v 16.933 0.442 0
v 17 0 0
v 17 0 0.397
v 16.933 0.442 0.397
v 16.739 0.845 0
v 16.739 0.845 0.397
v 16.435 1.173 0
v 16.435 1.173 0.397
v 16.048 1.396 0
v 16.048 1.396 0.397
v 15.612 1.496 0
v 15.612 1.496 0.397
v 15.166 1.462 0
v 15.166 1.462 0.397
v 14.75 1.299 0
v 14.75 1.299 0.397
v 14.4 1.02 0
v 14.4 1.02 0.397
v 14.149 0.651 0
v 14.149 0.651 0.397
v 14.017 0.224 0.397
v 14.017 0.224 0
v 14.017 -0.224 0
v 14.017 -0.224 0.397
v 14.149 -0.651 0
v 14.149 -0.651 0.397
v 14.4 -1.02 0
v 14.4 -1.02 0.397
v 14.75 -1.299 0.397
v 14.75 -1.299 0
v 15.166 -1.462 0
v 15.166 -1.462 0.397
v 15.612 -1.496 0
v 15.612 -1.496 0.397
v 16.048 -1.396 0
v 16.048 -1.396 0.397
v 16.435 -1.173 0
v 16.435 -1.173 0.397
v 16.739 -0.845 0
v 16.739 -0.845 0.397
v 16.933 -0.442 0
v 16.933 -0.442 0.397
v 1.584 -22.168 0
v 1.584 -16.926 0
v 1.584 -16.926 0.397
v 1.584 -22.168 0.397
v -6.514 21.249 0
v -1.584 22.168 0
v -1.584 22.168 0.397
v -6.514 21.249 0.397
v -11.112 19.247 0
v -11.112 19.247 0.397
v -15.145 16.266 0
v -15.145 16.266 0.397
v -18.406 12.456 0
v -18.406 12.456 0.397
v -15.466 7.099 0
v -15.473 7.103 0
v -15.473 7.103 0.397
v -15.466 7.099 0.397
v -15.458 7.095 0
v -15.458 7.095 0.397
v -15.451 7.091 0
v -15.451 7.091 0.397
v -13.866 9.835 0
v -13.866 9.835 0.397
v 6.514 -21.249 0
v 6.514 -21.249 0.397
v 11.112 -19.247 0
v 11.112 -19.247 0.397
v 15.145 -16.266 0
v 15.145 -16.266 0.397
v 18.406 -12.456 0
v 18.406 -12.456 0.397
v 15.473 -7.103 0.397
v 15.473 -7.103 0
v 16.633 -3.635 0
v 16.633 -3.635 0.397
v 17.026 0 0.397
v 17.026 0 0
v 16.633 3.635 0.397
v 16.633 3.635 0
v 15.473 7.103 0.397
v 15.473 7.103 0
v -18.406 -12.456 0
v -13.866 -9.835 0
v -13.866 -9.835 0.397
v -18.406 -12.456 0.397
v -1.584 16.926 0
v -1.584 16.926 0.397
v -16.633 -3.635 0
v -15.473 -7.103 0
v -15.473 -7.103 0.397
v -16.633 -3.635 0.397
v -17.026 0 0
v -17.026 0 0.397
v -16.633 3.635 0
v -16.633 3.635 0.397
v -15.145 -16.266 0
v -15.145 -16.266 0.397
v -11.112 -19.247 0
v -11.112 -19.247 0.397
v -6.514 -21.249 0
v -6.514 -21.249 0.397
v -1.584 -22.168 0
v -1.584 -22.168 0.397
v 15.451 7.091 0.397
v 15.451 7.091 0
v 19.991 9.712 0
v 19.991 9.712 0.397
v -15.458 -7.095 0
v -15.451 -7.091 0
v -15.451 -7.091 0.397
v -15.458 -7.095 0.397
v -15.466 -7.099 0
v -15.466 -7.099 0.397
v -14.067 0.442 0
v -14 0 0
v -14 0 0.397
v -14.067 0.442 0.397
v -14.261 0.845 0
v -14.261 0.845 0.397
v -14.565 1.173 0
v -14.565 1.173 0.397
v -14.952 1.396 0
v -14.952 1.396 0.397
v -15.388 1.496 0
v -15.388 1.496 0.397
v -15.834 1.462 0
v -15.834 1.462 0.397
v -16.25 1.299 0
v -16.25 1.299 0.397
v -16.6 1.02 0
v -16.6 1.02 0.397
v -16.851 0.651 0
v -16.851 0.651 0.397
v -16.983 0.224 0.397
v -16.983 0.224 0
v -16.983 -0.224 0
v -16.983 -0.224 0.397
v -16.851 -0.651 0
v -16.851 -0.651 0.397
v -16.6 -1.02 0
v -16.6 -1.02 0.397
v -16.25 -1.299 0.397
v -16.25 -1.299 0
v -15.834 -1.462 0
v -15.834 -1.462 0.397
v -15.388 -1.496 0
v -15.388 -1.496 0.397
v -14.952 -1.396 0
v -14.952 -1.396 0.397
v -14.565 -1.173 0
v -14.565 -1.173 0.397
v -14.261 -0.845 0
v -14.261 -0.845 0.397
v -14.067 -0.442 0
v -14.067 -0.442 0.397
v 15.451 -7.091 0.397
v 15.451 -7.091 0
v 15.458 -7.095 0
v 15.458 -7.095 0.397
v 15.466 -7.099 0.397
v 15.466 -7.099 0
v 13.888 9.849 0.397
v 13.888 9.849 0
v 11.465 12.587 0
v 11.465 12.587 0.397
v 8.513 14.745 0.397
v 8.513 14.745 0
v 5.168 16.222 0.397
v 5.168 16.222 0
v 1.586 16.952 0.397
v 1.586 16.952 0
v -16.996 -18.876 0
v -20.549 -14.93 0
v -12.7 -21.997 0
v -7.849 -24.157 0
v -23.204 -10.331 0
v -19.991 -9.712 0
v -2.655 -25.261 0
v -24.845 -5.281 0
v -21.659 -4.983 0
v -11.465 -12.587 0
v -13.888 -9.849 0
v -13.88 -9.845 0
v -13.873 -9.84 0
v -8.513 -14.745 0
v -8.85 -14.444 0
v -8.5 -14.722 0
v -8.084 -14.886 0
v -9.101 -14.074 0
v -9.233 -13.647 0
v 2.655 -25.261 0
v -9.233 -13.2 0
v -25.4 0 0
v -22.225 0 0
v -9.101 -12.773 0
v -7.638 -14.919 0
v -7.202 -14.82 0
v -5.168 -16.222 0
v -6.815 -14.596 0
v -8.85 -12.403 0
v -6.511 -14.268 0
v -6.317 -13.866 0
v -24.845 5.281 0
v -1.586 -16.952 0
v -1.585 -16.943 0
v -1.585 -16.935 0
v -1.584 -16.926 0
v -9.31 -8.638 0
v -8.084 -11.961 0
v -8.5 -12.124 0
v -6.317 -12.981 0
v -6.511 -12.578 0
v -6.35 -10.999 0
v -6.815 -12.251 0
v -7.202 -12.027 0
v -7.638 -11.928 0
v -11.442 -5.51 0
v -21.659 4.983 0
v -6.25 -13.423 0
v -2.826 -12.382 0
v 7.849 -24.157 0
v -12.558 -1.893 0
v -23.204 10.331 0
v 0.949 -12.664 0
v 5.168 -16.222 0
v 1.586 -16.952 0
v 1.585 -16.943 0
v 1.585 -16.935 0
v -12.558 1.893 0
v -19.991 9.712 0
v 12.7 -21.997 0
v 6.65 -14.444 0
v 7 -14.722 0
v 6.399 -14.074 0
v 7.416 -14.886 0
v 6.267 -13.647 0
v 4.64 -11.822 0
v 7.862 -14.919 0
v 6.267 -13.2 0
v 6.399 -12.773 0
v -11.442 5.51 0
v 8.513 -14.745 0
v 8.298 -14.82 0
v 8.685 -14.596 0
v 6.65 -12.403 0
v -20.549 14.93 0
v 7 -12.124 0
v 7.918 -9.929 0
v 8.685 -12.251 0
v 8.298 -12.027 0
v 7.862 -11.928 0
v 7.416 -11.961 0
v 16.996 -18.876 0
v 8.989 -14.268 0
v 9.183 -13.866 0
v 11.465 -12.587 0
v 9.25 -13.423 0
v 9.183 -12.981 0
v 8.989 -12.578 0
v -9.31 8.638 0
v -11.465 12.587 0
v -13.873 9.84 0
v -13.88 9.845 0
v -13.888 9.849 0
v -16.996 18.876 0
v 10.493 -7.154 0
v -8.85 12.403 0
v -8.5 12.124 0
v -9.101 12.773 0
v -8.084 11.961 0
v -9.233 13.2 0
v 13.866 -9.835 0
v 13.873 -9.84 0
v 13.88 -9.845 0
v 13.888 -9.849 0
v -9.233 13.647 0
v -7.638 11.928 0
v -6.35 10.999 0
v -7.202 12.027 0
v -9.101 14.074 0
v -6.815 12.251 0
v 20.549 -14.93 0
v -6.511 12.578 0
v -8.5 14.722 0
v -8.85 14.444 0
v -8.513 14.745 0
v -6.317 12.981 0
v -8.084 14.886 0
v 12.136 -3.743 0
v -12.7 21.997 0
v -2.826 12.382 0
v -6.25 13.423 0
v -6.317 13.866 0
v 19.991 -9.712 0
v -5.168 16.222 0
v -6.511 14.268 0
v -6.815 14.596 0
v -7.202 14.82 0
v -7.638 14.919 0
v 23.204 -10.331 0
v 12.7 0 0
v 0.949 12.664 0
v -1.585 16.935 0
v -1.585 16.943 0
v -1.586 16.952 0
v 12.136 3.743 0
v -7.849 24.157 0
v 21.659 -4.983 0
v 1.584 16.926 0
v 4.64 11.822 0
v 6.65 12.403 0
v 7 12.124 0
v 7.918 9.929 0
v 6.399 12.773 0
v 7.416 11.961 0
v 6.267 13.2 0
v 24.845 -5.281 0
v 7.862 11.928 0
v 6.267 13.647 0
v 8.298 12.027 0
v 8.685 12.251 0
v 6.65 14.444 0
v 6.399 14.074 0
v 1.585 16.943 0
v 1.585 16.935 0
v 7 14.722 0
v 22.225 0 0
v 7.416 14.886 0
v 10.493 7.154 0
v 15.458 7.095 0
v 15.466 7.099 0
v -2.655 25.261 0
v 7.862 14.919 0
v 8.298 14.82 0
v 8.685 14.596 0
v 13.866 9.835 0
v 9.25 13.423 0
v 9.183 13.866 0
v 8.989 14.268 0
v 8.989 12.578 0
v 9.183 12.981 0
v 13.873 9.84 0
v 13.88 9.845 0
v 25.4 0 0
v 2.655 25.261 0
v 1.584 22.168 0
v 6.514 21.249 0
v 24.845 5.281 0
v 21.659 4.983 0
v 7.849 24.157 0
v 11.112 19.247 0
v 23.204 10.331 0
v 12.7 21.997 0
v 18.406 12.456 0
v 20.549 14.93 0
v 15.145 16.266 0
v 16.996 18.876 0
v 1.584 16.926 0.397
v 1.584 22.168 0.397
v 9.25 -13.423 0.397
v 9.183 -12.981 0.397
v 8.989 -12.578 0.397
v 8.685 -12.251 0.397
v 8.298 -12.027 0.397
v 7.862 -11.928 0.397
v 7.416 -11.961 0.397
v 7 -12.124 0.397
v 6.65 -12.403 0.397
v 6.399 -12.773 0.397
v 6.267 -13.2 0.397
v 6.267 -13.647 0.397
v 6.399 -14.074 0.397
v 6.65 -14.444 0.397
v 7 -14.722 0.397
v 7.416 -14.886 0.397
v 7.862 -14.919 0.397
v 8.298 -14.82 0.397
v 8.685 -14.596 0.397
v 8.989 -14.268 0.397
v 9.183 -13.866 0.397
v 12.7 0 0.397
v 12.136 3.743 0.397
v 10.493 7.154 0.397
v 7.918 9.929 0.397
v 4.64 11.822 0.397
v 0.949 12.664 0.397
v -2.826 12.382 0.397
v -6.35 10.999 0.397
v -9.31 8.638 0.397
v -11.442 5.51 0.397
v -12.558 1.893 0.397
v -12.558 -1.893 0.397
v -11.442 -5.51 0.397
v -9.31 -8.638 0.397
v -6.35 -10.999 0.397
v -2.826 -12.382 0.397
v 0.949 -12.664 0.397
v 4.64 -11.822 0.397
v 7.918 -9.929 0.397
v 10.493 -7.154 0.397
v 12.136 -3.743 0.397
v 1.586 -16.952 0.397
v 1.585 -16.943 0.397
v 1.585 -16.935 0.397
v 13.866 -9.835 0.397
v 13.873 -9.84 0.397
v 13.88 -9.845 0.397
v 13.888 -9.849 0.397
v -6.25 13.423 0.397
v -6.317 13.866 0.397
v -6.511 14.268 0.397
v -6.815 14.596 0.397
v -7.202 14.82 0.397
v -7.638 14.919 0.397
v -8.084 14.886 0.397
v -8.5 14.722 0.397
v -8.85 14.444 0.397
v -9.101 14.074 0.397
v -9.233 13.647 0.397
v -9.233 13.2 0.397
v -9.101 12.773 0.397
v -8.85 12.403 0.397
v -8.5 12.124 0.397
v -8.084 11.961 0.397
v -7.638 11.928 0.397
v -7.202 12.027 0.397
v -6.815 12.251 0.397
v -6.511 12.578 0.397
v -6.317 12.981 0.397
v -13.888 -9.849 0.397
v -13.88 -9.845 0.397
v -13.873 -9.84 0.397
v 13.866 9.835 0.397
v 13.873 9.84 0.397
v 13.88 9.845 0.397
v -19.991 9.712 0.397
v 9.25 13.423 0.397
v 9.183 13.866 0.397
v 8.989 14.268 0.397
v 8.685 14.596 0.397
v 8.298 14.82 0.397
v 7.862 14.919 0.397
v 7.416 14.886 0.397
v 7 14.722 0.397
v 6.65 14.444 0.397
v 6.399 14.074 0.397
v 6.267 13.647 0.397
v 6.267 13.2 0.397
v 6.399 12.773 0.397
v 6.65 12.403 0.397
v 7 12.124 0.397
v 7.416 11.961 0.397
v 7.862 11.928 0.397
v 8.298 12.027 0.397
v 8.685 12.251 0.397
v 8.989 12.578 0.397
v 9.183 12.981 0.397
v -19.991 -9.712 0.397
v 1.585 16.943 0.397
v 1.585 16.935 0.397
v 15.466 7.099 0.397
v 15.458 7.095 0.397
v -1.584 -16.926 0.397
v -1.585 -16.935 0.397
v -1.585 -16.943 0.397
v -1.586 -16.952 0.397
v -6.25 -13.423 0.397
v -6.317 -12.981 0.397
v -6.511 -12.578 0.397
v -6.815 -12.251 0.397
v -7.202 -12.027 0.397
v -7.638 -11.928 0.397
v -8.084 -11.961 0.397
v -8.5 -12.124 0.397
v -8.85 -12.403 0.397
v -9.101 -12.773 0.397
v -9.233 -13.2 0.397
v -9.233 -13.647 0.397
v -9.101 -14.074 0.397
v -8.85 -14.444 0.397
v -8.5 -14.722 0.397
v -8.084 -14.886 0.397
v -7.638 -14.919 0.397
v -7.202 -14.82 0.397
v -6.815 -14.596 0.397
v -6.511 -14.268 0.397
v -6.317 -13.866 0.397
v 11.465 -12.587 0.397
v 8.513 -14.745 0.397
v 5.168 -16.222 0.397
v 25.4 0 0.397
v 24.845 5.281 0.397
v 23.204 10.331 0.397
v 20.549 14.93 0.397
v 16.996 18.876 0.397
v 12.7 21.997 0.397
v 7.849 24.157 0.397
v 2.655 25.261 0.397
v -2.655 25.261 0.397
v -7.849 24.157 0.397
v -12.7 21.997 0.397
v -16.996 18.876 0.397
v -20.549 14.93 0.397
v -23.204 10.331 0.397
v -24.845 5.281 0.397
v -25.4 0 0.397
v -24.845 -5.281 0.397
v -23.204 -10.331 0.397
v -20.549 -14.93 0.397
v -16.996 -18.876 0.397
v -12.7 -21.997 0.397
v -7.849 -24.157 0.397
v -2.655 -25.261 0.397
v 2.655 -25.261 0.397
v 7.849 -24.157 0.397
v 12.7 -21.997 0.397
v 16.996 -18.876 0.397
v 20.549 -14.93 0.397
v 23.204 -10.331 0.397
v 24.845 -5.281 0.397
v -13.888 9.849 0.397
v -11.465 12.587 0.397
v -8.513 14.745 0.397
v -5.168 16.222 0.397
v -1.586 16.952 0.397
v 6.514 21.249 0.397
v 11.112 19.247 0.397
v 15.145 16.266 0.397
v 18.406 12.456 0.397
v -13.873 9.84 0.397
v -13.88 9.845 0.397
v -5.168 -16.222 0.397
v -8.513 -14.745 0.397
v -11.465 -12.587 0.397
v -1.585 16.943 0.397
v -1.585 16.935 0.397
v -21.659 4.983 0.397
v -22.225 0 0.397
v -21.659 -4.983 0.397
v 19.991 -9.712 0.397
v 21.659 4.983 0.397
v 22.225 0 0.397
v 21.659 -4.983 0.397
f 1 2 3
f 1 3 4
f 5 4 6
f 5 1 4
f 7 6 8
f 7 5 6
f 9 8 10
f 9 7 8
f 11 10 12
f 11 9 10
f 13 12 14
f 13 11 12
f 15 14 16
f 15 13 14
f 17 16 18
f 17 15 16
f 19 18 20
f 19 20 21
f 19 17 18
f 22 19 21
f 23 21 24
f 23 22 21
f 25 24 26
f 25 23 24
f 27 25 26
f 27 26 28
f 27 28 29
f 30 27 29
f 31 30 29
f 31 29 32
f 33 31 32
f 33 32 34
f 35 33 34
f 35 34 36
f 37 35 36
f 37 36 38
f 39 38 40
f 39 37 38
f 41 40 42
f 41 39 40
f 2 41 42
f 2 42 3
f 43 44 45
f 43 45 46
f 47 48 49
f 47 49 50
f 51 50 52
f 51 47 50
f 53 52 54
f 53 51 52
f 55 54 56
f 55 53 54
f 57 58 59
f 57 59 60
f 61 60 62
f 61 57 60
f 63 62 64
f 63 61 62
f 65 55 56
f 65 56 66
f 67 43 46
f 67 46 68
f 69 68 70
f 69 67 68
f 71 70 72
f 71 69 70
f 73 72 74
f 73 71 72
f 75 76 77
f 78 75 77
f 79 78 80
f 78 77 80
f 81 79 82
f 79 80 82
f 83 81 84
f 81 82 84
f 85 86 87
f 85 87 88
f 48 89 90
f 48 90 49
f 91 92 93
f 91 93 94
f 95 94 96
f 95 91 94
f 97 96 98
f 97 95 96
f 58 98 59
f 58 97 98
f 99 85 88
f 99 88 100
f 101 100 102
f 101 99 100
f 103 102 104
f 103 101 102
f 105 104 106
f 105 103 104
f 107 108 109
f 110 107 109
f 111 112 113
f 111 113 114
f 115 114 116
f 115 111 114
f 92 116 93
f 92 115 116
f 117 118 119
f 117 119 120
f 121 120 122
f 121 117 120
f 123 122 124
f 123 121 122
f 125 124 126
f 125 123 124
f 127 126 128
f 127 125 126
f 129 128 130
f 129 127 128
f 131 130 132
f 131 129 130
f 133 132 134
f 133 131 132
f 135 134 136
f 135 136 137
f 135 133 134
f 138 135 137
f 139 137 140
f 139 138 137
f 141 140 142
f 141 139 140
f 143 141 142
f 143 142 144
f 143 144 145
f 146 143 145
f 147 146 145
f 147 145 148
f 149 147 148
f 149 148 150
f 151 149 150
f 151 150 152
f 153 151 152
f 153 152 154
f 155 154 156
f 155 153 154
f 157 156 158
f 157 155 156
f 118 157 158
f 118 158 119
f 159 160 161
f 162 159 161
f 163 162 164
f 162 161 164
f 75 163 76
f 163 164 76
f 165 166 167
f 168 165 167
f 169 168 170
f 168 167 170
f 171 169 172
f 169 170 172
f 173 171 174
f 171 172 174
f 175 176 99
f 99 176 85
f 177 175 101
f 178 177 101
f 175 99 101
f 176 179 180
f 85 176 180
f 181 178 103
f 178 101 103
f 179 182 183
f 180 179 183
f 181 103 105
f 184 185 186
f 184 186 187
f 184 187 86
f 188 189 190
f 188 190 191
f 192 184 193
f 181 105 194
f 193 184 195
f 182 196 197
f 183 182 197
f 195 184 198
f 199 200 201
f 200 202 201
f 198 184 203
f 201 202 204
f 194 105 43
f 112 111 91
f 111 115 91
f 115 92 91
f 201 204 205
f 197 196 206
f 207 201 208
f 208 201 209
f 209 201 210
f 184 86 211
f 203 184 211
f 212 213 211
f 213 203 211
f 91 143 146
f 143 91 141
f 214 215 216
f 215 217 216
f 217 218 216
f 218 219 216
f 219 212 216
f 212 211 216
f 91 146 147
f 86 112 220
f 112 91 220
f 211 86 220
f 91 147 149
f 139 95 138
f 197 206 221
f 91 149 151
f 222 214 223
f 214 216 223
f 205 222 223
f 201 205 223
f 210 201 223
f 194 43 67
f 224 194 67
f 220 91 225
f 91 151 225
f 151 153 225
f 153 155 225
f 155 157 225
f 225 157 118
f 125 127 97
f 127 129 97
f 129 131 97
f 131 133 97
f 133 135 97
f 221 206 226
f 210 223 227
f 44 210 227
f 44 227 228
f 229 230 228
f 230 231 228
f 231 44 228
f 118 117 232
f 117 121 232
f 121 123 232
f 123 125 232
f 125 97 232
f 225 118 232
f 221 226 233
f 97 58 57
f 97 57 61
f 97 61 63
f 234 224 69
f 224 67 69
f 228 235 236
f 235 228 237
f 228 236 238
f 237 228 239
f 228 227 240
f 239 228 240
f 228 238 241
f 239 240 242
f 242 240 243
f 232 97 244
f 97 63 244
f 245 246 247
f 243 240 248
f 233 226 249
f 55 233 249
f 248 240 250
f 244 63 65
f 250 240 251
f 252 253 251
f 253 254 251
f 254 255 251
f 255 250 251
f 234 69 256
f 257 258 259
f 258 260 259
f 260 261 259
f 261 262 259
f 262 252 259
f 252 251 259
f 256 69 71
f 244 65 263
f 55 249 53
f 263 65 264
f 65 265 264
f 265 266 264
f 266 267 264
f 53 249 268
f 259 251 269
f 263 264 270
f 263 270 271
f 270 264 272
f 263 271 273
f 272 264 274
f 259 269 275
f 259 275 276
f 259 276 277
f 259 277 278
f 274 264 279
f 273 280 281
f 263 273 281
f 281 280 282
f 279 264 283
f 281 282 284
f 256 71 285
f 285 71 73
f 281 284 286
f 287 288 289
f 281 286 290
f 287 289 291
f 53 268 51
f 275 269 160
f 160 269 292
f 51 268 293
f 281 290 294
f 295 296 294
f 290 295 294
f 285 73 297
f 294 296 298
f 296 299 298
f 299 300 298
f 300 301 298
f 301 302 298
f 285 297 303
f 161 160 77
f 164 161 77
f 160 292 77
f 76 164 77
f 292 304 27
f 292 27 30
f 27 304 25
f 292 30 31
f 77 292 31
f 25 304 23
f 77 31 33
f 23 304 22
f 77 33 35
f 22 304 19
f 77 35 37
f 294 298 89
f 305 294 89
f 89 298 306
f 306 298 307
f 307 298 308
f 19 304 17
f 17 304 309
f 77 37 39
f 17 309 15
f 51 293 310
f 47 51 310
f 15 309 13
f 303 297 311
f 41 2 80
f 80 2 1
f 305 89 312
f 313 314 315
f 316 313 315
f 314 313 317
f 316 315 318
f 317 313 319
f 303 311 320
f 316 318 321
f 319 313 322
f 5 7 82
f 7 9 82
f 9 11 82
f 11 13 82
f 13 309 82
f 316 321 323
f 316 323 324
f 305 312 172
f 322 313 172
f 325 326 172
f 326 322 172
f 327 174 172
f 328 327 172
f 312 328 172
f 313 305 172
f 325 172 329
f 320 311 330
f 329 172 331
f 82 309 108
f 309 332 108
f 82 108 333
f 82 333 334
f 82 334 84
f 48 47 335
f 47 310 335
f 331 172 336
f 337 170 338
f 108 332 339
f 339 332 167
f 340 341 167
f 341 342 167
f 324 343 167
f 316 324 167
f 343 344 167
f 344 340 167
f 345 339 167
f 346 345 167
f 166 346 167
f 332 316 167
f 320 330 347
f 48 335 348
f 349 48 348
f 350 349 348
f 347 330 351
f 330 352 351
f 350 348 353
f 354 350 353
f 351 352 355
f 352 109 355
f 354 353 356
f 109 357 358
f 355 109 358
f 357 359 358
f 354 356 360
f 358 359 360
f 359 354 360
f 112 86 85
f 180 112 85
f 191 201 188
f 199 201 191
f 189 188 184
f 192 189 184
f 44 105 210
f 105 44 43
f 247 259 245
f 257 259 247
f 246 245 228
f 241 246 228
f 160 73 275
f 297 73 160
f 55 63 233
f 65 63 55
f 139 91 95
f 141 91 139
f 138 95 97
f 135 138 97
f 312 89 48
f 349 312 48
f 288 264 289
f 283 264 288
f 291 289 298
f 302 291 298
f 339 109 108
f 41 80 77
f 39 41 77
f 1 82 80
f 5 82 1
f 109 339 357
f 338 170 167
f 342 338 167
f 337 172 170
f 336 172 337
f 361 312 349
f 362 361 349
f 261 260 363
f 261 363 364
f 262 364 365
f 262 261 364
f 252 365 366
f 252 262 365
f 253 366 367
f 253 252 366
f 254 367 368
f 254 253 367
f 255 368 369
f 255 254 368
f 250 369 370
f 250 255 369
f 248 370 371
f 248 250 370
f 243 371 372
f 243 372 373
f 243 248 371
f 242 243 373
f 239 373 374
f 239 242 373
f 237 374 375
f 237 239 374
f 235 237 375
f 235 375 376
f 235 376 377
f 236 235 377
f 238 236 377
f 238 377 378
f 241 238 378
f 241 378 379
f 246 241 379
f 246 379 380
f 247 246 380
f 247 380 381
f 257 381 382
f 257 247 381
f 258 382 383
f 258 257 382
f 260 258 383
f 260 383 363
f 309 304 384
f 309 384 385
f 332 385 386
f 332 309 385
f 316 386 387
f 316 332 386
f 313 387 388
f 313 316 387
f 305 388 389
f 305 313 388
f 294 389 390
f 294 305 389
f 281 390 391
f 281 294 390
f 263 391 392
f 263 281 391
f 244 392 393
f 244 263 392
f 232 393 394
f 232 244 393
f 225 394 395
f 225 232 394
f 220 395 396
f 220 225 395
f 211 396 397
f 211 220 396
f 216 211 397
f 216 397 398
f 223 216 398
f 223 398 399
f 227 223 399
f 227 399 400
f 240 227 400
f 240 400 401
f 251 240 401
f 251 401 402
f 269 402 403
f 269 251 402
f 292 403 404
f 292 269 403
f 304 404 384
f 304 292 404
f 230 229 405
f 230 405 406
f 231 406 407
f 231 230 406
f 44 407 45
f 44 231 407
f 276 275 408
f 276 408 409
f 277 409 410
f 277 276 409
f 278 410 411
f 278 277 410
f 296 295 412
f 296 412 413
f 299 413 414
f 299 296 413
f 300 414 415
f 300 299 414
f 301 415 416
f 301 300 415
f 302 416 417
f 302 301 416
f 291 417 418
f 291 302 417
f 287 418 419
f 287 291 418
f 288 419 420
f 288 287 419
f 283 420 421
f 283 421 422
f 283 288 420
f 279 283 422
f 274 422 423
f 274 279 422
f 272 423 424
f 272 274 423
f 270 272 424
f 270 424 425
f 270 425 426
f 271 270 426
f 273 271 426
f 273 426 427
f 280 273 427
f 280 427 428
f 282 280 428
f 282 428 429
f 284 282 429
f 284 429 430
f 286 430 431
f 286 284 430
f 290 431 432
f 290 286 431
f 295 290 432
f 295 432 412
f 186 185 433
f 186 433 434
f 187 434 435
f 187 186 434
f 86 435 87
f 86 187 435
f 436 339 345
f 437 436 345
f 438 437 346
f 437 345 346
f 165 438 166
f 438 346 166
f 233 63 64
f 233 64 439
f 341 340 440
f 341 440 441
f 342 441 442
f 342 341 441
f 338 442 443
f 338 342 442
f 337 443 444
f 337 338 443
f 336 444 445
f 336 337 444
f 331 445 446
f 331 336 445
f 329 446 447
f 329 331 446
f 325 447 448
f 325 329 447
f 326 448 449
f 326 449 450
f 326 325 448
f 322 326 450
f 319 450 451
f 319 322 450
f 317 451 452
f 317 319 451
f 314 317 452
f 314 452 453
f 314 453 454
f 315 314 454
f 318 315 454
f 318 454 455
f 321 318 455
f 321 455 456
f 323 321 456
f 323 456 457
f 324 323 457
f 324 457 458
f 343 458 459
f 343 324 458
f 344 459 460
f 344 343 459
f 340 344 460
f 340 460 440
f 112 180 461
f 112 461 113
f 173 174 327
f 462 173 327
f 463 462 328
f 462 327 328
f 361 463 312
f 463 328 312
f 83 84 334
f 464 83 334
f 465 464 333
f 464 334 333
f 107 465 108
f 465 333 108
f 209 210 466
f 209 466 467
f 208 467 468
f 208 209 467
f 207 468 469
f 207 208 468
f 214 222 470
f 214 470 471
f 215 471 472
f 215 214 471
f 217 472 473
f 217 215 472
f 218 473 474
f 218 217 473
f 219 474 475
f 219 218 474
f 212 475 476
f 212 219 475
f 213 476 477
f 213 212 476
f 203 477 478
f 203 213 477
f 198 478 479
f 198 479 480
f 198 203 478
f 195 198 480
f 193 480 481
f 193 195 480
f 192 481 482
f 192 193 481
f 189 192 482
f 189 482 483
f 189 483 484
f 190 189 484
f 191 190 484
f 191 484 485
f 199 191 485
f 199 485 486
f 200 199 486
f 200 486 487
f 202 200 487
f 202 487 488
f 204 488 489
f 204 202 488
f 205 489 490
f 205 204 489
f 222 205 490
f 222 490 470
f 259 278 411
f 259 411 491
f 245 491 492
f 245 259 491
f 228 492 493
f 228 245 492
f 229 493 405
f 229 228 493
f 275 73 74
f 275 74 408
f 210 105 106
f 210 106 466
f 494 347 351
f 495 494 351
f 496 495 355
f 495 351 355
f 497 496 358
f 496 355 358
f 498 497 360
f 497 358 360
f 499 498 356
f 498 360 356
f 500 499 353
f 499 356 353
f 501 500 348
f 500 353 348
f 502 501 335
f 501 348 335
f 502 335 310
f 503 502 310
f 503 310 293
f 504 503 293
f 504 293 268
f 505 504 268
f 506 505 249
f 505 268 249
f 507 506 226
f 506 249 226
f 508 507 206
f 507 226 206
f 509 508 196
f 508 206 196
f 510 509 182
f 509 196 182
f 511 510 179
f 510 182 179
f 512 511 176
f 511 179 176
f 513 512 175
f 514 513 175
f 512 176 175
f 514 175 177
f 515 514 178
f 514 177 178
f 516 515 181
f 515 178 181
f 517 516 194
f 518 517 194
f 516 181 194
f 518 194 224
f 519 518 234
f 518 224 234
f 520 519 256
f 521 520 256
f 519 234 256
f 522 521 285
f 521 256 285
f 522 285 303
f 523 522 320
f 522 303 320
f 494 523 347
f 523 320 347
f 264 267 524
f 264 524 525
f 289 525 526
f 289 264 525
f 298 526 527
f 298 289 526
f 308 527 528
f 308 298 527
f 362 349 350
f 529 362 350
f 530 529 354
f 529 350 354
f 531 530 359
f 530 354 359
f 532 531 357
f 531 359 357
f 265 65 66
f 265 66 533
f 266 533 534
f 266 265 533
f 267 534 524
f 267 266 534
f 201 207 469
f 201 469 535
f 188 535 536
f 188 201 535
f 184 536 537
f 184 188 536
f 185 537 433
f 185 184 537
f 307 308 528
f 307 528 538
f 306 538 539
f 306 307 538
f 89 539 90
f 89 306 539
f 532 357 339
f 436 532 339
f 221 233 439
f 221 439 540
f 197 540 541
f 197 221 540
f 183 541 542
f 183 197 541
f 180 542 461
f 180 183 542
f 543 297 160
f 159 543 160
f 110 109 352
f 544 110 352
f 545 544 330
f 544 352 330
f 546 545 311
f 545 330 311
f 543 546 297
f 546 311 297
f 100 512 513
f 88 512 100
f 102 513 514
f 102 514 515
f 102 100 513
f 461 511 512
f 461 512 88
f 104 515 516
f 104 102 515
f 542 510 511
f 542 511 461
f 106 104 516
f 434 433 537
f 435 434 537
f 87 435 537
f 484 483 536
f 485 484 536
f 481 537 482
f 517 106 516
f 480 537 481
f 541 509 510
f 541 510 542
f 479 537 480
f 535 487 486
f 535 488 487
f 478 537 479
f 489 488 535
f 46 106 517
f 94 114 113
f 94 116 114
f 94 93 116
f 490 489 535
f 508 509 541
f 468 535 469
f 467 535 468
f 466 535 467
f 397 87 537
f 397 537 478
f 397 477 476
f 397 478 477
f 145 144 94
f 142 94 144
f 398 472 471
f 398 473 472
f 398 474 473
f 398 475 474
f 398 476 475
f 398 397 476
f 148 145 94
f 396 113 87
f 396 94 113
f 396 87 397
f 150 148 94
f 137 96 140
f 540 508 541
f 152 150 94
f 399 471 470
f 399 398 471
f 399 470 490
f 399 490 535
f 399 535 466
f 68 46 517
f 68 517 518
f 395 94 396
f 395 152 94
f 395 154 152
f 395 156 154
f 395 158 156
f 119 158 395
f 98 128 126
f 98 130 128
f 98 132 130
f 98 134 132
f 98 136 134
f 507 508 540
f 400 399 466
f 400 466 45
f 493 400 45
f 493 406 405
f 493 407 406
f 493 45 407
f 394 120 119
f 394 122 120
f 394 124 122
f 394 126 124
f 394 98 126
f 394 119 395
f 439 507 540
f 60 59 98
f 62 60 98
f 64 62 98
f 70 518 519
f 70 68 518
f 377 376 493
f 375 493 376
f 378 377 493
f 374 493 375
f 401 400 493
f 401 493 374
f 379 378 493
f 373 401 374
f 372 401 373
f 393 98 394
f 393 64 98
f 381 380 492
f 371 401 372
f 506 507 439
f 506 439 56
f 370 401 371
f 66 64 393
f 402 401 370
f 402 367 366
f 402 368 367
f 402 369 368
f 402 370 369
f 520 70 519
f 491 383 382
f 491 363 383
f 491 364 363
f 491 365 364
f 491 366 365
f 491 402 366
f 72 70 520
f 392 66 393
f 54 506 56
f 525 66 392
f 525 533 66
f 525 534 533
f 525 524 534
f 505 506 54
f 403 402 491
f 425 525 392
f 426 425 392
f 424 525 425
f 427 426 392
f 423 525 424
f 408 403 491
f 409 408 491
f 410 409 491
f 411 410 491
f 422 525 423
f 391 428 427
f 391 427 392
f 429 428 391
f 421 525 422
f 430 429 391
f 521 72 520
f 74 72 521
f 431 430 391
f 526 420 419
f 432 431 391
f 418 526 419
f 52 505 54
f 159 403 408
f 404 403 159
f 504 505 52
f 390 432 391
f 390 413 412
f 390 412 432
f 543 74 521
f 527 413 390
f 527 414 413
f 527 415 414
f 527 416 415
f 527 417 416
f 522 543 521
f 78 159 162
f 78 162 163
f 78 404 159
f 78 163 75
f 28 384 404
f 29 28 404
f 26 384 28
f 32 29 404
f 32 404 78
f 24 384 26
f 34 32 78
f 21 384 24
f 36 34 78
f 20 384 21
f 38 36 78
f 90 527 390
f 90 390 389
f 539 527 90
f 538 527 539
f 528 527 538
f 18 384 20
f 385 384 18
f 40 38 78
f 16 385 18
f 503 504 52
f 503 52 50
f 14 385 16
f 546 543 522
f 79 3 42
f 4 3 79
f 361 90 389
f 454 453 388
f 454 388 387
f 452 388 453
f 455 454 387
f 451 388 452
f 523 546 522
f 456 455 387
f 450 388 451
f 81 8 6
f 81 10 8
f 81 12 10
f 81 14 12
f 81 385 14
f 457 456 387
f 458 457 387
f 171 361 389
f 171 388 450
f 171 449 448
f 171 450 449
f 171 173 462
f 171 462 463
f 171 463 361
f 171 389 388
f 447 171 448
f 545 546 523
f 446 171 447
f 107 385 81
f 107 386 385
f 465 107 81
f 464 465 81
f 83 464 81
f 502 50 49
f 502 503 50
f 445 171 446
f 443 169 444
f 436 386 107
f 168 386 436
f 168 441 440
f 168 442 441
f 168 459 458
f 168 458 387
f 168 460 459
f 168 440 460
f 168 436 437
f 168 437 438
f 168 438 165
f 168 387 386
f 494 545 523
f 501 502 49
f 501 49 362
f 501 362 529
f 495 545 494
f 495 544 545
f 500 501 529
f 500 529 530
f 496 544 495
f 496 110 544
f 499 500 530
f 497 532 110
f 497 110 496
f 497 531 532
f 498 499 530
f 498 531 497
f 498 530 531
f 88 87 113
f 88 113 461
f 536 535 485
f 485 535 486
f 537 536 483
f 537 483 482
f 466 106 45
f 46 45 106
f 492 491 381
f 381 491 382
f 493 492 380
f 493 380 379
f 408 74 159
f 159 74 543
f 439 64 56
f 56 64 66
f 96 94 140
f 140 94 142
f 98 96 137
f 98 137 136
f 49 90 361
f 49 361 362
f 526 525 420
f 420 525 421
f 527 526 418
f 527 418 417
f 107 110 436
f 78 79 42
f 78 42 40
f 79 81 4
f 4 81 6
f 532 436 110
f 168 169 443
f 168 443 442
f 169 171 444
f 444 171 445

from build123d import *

# Parameters (mm, degrees)
SKETCH1_R           = 25.4
SKETCH1_R_2         = 1.5
SKETCH1_R_3         = 12.7
BOSS_EXTRUDE1_DEPTH = 0.396875


with BuildPart() as part:
    # Sketch1 → Boss-Extrude1 (new body)
    with BuildSketch(Plane.XY):
        Circle(SKETCH1_R)
        with Locations((-15.5, 0)):
            Circle(SKETCH1_R_2, mode=Mode.SUBTRACT)
        with Locations((-7.75, 13.423393759)):
            Circle(SKETCH1_R_2, mode=Mode.SUBTRACT)
        with Locations((7.75, 13.423393759)):
            Circle(SKETCH1_R_2, mode=Mode.SUBTRACT)
        with Locations((15.5, 0)):
            Circle(SKETCH1_R_2, mode=Mode.SUBTRACT)
        with Locations((7.75, -13.423393759)):
            Circle(SKETCH1_R_2, mode=Mode.SUBTRACT)
        with Locations((-7.75, -13.423393759)):
            Circle(SKETCH1_R_2, mode=Mode.SUBTRACT)
        Circle(SKETCH1_R_3, mode=Mode.SUBTRACT)
        with BuildLine():
            Line((-1.58439638, 16.926006266), (-1.58439638, 22.168453106))
            ThreePointArc((-1.58439638, 22.168453106), (-11.1125, 19.247414599), (-18.406245362, 12.456354068))
            Line((-18.406245362, 12.456354068), (-13.866153221, 9.835130648))
            ThreePointArc((-13.866153221, 9.835130648), (-13.876900865, 9.842174678), (-13.88768889, 9.849154838))
            ThreePointArc((-13.88768889, 9.849154838), (-8.512839622, 14.744670742), (-1.58577385, 16.951668798))
            ThreePointArc((-1.58577385, 16.951668798), (-1.585122867, 16.938836014), (-1.58439638, 16.926006266))
        make_face(mode=Mode.SUBTRACT)
        with BuildLine():
            Line((1.58439638, 16.926006266), (1.58439638, 22.168453106))
            ThreePointArc((1.58439638, 22.168453106), (11.1125, 19.247414599), (18.406245362, 12.456354068))
            Line((18.406245362, 12.456354068), (13.866153221, 9.835130648))
            ThreePointArc((13.866153221, 9.835130648), (13.876900865, 9.842174678), (13.88768889, 9.849154838))
            ThreePointArc((13.88768889, 9.849154838), (8.512839622, 14.744670742), (1.58577385, 16.951668798))
            ThreePointArc((1.58577385, 16.951668798), (1.585122867, 16.938836014), (1.58439638, 16.926006266))
        make_face(mode=Mode.SUBTRACT)
        with BuildLine():
            Line((15.450549601, 7.090875618), (19.990641742, 9.712099038))
            ThreePointArc((19.990641742, 9.712099038), (22.225, 0), (19.990641742, -9.712099038))
            Line((19.990641742, -9.712099038), (15.450549601, -7.090875618))
            ThreePointArc((15.450549601, -7.090875618), (15.462023732, -7.096661336), (15.47346274, -7.10251396))
            ThreePointArc((15.47346274, -7.10251396), (17.025679244, 0), (15.47346274, 7.10251396))
            ThreePointArc((15.47346274, 7.10251396), (15.462023732, 7.096661336), (15.450549601, 7.090875618))
        make_face(mode=Mode.SUBTRACT)
        with BuildLine():
            Line((-15.450549601, 7.090875618), (-19.990641742, 9.712099038))
            ThreePointArc((-19.990641742, 9.712099038), (-22.225, 0), (-19.990641742, -9.712099038))
            Line((-19.990641742, -9.712099038), (-15.450549601, -7.090875618))
            ThreePointArc((-15.450549601, -7.090875618), (-15.462023732, -7.096661336), (-15.47346274, -7.10251396))
            ThreePointArc((-15.47346274, -7.10251396), (-17.025679244, 0), (-15.47346274, 7.10251396))
            ThreePointArc((-15.47346274, 7.10251396), (-15.462023732, 7.096661336), (-15.450549601, 7.090875618))
        make_face(mode=Mode.SUBTRACT)
        with BuildLine():
            Line((-13.866153221, -9.835130648), (-18.406245362, -12.456354068))
            ThreePointArc((-18.406245362, -12.456354068), (-11.1125, -19.247414599), (-1.58439638, -22.168453106))
            Line((-1.58439638, -22.168453106), (-1.58439638, -16.926006266))
            ThreePointArc((-1.58439638, -16.926006266), (-1.585122867, -16.938836014), (-1.58577385, -16.951668798))
            ThreePointArc((-1.58577385, -16.951668798), (-8.512839622, -14.744670742), (-13.88768889, -9.849154838))
            ThreePointArc((-13.88768889, -9.849154838), (-13.876900865, -9.842174678), (-13.866153221, -9.835130648))
        make_face(mode=Mode.SUBTRACT)
        with BuildLine():
            Line((1.58439638, -16.926006266), (1.58439638, -22.168453106))
            ThreePointArc((1.58439638, -22.168453106), (11.1125, -19.247414599), (18.406245362, -12.456354068))
            Line((18.406245362, -12.456354068), (13.866153221, -9.835130648))
            ThreePointArc((13.866153221, -9.835130648), (13.876900865, -9.842174678), (13.88768889, -9.849154838))
            ThreePointArc((13.88768889, -9.849154838), (8.512839622, -14.744670742), (1.58577385, -16.951668798))
            ThreePointArc((1.58577385, -16.951668798), (1.585122867, -16.938836014), (1.58439638, -16.926006266))
        make_face(mode=Mode.SUBTRACT)
    extrude(amount=BOSS_EXTRUDE1_DEPTH)


solid = part.part
